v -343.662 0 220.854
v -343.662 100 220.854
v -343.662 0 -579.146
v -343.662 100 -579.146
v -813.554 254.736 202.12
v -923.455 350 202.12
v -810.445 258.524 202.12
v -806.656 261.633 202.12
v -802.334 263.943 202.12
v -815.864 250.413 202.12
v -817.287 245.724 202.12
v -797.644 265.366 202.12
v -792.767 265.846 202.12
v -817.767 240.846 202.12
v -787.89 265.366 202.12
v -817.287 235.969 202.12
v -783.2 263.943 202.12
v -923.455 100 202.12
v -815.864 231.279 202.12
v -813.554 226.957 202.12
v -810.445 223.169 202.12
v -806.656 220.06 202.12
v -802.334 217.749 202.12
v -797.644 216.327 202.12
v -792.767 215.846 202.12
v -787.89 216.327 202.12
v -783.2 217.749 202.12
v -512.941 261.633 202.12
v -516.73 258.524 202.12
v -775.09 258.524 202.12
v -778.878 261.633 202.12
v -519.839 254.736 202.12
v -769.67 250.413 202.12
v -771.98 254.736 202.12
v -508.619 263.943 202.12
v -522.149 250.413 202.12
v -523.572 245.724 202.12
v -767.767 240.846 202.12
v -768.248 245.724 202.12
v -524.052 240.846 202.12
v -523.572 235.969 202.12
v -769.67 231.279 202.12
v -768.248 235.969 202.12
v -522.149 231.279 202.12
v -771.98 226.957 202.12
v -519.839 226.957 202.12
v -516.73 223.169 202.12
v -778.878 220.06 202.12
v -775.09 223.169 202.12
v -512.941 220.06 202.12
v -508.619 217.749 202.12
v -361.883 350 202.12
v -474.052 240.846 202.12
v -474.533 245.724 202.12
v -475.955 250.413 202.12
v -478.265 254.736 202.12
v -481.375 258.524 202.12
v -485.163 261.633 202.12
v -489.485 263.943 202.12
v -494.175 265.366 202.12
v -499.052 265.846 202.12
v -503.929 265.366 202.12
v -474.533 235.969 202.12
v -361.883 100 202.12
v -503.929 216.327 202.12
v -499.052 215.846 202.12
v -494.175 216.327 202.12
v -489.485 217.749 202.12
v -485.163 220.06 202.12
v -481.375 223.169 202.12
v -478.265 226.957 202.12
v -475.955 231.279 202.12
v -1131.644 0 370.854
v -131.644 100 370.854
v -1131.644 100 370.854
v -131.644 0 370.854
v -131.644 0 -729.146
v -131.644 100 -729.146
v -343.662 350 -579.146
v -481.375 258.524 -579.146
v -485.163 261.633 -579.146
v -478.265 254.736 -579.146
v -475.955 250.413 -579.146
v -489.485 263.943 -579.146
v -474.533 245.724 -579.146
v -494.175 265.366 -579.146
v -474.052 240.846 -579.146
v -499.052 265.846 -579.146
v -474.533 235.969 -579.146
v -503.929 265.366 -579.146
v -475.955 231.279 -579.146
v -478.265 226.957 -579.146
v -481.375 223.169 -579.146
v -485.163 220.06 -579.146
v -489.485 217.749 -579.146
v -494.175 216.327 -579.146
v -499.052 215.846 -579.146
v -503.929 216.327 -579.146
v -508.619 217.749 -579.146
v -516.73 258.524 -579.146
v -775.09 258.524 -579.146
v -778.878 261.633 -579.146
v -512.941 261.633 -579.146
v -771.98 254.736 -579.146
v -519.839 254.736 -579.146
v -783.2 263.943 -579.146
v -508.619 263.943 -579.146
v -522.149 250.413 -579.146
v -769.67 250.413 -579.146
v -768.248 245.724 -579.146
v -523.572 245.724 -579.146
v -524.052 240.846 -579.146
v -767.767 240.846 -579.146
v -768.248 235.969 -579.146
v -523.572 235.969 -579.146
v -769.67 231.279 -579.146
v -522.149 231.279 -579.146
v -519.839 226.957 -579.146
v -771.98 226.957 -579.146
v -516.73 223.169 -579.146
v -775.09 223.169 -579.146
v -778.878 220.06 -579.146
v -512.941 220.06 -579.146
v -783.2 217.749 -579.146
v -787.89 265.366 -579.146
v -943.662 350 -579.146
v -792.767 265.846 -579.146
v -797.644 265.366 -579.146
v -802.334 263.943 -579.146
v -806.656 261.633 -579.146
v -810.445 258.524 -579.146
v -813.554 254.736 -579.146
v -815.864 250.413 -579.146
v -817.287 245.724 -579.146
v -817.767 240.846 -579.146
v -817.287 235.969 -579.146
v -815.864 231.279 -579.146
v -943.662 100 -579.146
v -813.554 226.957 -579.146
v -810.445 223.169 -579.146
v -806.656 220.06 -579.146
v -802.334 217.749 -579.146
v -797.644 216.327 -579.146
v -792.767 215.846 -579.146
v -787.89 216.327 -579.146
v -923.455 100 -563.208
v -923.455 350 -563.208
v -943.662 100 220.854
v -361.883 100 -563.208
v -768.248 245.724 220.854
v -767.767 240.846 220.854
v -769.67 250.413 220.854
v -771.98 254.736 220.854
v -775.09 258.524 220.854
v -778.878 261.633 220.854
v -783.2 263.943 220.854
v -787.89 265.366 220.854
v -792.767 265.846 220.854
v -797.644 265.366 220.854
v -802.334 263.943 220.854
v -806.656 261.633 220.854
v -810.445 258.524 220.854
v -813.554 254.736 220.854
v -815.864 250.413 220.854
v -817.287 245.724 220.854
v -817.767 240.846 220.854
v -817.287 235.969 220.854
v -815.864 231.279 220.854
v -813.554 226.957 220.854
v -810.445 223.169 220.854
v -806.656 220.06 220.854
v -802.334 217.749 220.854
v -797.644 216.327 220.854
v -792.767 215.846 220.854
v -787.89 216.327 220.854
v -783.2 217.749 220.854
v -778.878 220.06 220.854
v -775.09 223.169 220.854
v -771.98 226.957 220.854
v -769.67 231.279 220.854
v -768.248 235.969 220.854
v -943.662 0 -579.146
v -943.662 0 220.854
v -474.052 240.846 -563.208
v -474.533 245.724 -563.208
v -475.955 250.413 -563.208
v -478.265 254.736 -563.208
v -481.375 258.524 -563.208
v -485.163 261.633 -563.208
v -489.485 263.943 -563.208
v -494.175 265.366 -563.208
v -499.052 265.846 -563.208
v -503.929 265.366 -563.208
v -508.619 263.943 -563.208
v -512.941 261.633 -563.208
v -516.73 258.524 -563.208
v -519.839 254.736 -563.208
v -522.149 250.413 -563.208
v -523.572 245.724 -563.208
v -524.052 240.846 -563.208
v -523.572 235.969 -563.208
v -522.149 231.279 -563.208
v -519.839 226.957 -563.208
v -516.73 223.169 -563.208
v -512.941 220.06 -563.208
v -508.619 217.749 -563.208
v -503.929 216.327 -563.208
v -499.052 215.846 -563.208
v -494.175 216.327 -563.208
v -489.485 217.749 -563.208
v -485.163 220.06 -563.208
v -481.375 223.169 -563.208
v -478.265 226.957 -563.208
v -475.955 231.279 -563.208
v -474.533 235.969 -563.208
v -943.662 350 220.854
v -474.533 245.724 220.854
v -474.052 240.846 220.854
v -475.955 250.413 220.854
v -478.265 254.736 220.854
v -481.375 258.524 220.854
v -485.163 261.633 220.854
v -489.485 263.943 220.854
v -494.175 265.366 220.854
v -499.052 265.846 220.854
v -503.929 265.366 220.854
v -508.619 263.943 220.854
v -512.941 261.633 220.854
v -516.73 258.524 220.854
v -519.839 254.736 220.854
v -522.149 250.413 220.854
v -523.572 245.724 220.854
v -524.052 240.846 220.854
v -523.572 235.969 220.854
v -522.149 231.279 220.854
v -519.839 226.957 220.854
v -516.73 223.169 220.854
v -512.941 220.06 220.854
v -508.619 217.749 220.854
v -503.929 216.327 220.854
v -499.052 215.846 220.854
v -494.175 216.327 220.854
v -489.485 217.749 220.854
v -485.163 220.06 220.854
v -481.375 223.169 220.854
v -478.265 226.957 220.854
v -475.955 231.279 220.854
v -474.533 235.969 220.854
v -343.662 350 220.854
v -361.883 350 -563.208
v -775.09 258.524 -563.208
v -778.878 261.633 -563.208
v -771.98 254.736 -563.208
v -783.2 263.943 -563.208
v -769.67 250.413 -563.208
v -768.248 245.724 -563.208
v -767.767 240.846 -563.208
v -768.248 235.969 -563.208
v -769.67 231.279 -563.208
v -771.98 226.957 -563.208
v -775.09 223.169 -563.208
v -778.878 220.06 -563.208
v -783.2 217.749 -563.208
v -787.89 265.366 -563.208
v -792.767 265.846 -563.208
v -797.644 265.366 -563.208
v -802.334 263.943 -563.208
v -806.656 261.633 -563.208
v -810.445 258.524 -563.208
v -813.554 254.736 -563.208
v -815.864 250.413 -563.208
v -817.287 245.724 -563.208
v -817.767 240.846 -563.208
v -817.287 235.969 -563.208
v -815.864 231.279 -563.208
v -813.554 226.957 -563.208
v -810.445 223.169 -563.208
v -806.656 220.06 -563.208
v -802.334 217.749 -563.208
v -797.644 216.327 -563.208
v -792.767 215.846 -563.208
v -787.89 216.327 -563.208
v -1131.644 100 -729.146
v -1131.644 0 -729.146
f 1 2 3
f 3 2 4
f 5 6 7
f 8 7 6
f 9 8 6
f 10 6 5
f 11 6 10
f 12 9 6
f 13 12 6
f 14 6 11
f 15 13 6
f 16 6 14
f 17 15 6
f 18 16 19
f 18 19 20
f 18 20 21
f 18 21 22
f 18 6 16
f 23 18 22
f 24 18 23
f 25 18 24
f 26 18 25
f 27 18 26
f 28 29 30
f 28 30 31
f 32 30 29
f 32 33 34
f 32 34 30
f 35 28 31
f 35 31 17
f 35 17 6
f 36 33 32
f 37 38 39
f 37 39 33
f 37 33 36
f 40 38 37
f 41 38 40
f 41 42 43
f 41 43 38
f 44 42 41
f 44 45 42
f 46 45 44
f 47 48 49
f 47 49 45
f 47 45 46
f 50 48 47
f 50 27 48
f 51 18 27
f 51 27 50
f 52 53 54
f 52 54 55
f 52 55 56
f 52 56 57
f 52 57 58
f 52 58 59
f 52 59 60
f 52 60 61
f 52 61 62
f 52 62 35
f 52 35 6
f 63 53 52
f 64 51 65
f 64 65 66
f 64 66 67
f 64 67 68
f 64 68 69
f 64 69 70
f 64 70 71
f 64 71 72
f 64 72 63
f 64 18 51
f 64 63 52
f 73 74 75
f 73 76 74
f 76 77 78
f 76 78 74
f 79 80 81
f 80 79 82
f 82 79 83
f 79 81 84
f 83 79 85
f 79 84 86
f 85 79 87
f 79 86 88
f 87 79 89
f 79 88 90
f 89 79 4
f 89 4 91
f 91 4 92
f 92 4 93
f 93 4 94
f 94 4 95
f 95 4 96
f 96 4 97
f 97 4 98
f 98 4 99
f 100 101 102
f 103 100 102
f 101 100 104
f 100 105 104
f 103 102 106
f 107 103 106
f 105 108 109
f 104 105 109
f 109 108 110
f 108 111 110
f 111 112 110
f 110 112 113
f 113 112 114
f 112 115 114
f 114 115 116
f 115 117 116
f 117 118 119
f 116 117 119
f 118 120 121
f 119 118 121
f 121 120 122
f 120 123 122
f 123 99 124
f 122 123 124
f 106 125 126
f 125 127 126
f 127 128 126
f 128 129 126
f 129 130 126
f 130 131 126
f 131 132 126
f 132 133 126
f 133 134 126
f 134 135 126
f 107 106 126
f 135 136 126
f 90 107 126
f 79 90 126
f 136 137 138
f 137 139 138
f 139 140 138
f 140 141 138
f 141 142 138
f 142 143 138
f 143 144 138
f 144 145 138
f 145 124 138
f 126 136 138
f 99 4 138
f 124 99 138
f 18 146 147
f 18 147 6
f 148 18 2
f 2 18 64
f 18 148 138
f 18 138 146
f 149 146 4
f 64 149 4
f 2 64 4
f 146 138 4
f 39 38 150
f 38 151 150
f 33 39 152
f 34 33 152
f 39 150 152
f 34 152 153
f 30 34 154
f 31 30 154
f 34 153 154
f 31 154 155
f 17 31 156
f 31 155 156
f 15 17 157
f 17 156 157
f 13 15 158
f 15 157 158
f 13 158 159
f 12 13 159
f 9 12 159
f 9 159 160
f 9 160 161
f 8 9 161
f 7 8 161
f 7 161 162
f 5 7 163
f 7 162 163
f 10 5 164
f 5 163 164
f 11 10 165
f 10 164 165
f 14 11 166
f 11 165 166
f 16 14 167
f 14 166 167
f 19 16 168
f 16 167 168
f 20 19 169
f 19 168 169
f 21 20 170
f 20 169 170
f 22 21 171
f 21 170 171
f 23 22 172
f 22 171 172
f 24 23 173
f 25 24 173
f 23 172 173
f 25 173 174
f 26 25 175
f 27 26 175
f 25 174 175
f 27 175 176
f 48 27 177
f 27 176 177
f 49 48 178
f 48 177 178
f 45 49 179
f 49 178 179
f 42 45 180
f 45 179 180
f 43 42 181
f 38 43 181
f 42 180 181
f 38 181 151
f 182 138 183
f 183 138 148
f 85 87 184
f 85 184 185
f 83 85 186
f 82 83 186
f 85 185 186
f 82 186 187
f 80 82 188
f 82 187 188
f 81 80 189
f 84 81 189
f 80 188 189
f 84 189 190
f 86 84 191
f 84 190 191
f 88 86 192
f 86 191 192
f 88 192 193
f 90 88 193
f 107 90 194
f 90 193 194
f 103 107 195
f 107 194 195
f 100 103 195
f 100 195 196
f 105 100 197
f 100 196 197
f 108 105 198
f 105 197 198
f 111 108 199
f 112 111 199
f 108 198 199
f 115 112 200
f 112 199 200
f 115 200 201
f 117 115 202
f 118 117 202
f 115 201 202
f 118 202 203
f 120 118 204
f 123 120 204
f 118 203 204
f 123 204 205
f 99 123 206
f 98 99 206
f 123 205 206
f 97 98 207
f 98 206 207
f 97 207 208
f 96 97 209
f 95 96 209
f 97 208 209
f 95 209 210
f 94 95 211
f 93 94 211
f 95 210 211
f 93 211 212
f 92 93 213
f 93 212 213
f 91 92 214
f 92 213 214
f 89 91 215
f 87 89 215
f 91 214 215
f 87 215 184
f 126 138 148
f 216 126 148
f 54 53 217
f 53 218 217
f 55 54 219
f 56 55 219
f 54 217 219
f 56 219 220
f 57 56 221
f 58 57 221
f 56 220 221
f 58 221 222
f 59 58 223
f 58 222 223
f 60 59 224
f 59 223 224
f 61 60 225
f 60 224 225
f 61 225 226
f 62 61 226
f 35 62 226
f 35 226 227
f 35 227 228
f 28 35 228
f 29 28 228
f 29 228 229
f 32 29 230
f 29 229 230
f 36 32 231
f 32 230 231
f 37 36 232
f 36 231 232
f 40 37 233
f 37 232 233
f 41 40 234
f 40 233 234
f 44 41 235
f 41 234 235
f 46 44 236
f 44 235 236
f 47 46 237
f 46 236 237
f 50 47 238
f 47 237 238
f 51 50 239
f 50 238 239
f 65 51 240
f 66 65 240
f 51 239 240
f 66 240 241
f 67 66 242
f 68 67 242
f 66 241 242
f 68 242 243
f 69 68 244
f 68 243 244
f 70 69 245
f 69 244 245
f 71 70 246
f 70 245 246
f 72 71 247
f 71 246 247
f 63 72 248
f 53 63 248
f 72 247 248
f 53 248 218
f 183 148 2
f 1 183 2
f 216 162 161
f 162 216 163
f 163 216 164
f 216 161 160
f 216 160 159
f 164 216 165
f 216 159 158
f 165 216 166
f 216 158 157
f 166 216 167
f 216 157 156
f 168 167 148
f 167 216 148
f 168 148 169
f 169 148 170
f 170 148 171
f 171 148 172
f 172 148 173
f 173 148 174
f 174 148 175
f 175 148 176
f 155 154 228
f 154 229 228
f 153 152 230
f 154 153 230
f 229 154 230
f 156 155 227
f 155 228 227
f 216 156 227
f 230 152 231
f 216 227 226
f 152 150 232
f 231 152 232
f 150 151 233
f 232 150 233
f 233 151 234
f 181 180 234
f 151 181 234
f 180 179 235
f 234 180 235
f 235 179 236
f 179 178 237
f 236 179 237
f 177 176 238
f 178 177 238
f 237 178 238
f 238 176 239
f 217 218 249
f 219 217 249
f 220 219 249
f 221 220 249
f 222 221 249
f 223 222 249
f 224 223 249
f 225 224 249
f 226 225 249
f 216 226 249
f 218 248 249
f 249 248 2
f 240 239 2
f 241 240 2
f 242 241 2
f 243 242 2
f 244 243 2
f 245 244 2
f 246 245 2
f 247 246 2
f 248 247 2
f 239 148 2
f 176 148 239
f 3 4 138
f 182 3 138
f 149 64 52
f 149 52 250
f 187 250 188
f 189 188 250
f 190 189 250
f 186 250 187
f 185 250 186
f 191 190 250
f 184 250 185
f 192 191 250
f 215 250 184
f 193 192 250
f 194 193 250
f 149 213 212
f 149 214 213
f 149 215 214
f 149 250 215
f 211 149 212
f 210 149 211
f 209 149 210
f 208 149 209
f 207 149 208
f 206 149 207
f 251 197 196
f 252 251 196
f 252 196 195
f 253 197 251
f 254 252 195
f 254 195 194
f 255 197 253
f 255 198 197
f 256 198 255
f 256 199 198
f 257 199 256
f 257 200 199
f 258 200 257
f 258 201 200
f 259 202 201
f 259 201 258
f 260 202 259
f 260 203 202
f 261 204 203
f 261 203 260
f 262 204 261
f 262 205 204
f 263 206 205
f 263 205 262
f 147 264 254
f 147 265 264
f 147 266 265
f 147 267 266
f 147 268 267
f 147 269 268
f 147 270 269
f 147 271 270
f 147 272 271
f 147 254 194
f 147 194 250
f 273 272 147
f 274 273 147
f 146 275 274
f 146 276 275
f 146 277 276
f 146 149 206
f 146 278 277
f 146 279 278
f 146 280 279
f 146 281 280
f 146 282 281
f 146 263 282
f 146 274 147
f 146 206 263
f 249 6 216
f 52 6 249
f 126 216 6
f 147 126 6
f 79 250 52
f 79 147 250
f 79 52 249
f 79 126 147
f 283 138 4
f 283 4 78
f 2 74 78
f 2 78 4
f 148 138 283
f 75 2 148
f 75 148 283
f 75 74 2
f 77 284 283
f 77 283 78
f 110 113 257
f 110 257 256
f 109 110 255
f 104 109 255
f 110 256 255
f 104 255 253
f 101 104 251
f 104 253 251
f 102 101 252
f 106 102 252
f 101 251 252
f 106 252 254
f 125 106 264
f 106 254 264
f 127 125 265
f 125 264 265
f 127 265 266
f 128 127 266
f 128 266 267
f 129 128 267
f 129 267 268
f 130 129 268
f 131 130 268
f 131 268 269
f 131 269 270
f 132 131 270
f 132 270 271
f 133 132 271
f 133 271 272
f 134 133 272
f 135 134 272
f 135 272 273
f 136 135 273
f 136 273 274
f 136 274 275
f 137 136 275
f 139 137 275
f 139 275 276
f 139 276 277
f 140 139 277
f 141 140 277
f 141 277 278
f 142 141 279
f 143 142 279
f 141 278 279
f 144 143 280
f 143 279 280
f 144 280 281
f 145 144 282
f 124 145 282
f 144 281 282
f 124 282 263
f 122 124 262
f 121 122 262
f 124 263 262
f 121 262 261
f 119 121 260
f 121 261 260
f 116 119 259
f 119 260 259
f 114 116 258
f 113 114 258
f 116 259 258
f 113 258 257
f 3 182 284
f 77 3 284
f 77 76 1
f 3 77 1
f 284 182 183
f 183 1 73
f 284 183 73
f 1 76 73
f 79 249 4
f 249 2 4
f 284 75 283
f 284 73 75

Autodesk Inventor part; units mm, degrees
ref_plane "YZ Plane" through (0, 0, 0) normal (1, 0, 0) x (0, 1, 0)
ref_plane "XZ Plane" through (0, 0, 0) normal (0, 1, 0) x (-1, 0, 0)
ref_plane "XY Plane" through (0, 0, 0) normal (0, 0, 1) x (1, 0, 0)
sketch "Sketch1" plane through (0, 0, 0) normal (0, 1, 0) x (-1, 0, 0)
  line L0 (131.6438, 370.8535) -> (1131.6438, 370.8535)
  line L1 (1131.6438, 370.8535) -> (1131.6438, -729.1465)
  line L2 (1131.6438, -729.1465) -> (131.6438, -729.1465)
  line L3 (131.6438, -729.1465) -> (131.6438, 370.8535)
  point P0 (0, 0)
  dimension "d0" = 1100
  dimension "d1" = 1000
extrude "Extrusion1" add sketch "Sketch1" along normal blind 100
sketch "Sketch2" plane through (0, 100, 0) normal (0, 1, 0) x (1, 0, 0)
  line L0 (-943.6624, -220.8535) -> (-343.6624, -220.8535)
  line L1 (-343.6624, -220.8535) -> (-343.6624, 579.1465)
  line L2 (-343.6624, 579.1465) -> (-943.6624, 579.1465)
  line L3 (-943.6624, 579.1465) -> (-943.6624, -220.8535)
  line L4 (-1131.6438, -370.8535) -> (-131.6438, -370.8535) projected
  point P0 (0, 0)
  dimension "d4" = 800
  dimension "d5" = 600
  dimension "d6" = 150
extrude "Extrusion2" cut sketch "Sketch2" against normal blind 100
sketch "Sketch3" plane through (0, 100, 0) normal (0, 1, 0) x (1, 0, 0)
  line L0 (-943.6624, -220.8535) -> (-343.6624, -220.8535) projected
  line L1 (-343.6624, 579.1465) -> (-943.6624, 579.1465) projected
  line L2 (-943.6624, -220.8535) -> (-343.6624, -220.8535)
  line L3 (-343.6624, -220.8535) -> (-343.6624, 579.1465)
  line L4 (-343.6624, 579.1465) -> (-943.6624, 579.1465)
  line L5 (-943.6624, 579.1465) -> (-943.6624, -220.8535)
  line L6 (-923.4548, -202.1195) -> (-361.8828, -202.1195)
  line L7 (-361.8828, -202.1195) -> (-361.8828, 563.2076)
  line L8 (-361.8828, 563.2076) -> (-923.4548, 563.2076)
  line L9 (-923.4548, 563.2076) -> (-923.4548, -202.1195)
  point P0 (0, 0)
  point P1 (-943.6624, 579.1465)
extrude "Extrusion3" add sketch "Sketch3" along normal blind 250
sketch "Sketch4" plane through (-943.6624, 100, 220.8535) normal (0, 0, 1) x (1, 0, 0)
  circle A0 centre (150.8952, 140.8463) radius 25
  circle A1 centre (444.6102, 140.8463) radius 25
  point P0 (943.6624, -100)
  dimension "d11" = 50
  dimension "d12" = 50
extrude "Extrusion4" cut sketch "Sketch4" against normal blind 2500
properties part number "table"
